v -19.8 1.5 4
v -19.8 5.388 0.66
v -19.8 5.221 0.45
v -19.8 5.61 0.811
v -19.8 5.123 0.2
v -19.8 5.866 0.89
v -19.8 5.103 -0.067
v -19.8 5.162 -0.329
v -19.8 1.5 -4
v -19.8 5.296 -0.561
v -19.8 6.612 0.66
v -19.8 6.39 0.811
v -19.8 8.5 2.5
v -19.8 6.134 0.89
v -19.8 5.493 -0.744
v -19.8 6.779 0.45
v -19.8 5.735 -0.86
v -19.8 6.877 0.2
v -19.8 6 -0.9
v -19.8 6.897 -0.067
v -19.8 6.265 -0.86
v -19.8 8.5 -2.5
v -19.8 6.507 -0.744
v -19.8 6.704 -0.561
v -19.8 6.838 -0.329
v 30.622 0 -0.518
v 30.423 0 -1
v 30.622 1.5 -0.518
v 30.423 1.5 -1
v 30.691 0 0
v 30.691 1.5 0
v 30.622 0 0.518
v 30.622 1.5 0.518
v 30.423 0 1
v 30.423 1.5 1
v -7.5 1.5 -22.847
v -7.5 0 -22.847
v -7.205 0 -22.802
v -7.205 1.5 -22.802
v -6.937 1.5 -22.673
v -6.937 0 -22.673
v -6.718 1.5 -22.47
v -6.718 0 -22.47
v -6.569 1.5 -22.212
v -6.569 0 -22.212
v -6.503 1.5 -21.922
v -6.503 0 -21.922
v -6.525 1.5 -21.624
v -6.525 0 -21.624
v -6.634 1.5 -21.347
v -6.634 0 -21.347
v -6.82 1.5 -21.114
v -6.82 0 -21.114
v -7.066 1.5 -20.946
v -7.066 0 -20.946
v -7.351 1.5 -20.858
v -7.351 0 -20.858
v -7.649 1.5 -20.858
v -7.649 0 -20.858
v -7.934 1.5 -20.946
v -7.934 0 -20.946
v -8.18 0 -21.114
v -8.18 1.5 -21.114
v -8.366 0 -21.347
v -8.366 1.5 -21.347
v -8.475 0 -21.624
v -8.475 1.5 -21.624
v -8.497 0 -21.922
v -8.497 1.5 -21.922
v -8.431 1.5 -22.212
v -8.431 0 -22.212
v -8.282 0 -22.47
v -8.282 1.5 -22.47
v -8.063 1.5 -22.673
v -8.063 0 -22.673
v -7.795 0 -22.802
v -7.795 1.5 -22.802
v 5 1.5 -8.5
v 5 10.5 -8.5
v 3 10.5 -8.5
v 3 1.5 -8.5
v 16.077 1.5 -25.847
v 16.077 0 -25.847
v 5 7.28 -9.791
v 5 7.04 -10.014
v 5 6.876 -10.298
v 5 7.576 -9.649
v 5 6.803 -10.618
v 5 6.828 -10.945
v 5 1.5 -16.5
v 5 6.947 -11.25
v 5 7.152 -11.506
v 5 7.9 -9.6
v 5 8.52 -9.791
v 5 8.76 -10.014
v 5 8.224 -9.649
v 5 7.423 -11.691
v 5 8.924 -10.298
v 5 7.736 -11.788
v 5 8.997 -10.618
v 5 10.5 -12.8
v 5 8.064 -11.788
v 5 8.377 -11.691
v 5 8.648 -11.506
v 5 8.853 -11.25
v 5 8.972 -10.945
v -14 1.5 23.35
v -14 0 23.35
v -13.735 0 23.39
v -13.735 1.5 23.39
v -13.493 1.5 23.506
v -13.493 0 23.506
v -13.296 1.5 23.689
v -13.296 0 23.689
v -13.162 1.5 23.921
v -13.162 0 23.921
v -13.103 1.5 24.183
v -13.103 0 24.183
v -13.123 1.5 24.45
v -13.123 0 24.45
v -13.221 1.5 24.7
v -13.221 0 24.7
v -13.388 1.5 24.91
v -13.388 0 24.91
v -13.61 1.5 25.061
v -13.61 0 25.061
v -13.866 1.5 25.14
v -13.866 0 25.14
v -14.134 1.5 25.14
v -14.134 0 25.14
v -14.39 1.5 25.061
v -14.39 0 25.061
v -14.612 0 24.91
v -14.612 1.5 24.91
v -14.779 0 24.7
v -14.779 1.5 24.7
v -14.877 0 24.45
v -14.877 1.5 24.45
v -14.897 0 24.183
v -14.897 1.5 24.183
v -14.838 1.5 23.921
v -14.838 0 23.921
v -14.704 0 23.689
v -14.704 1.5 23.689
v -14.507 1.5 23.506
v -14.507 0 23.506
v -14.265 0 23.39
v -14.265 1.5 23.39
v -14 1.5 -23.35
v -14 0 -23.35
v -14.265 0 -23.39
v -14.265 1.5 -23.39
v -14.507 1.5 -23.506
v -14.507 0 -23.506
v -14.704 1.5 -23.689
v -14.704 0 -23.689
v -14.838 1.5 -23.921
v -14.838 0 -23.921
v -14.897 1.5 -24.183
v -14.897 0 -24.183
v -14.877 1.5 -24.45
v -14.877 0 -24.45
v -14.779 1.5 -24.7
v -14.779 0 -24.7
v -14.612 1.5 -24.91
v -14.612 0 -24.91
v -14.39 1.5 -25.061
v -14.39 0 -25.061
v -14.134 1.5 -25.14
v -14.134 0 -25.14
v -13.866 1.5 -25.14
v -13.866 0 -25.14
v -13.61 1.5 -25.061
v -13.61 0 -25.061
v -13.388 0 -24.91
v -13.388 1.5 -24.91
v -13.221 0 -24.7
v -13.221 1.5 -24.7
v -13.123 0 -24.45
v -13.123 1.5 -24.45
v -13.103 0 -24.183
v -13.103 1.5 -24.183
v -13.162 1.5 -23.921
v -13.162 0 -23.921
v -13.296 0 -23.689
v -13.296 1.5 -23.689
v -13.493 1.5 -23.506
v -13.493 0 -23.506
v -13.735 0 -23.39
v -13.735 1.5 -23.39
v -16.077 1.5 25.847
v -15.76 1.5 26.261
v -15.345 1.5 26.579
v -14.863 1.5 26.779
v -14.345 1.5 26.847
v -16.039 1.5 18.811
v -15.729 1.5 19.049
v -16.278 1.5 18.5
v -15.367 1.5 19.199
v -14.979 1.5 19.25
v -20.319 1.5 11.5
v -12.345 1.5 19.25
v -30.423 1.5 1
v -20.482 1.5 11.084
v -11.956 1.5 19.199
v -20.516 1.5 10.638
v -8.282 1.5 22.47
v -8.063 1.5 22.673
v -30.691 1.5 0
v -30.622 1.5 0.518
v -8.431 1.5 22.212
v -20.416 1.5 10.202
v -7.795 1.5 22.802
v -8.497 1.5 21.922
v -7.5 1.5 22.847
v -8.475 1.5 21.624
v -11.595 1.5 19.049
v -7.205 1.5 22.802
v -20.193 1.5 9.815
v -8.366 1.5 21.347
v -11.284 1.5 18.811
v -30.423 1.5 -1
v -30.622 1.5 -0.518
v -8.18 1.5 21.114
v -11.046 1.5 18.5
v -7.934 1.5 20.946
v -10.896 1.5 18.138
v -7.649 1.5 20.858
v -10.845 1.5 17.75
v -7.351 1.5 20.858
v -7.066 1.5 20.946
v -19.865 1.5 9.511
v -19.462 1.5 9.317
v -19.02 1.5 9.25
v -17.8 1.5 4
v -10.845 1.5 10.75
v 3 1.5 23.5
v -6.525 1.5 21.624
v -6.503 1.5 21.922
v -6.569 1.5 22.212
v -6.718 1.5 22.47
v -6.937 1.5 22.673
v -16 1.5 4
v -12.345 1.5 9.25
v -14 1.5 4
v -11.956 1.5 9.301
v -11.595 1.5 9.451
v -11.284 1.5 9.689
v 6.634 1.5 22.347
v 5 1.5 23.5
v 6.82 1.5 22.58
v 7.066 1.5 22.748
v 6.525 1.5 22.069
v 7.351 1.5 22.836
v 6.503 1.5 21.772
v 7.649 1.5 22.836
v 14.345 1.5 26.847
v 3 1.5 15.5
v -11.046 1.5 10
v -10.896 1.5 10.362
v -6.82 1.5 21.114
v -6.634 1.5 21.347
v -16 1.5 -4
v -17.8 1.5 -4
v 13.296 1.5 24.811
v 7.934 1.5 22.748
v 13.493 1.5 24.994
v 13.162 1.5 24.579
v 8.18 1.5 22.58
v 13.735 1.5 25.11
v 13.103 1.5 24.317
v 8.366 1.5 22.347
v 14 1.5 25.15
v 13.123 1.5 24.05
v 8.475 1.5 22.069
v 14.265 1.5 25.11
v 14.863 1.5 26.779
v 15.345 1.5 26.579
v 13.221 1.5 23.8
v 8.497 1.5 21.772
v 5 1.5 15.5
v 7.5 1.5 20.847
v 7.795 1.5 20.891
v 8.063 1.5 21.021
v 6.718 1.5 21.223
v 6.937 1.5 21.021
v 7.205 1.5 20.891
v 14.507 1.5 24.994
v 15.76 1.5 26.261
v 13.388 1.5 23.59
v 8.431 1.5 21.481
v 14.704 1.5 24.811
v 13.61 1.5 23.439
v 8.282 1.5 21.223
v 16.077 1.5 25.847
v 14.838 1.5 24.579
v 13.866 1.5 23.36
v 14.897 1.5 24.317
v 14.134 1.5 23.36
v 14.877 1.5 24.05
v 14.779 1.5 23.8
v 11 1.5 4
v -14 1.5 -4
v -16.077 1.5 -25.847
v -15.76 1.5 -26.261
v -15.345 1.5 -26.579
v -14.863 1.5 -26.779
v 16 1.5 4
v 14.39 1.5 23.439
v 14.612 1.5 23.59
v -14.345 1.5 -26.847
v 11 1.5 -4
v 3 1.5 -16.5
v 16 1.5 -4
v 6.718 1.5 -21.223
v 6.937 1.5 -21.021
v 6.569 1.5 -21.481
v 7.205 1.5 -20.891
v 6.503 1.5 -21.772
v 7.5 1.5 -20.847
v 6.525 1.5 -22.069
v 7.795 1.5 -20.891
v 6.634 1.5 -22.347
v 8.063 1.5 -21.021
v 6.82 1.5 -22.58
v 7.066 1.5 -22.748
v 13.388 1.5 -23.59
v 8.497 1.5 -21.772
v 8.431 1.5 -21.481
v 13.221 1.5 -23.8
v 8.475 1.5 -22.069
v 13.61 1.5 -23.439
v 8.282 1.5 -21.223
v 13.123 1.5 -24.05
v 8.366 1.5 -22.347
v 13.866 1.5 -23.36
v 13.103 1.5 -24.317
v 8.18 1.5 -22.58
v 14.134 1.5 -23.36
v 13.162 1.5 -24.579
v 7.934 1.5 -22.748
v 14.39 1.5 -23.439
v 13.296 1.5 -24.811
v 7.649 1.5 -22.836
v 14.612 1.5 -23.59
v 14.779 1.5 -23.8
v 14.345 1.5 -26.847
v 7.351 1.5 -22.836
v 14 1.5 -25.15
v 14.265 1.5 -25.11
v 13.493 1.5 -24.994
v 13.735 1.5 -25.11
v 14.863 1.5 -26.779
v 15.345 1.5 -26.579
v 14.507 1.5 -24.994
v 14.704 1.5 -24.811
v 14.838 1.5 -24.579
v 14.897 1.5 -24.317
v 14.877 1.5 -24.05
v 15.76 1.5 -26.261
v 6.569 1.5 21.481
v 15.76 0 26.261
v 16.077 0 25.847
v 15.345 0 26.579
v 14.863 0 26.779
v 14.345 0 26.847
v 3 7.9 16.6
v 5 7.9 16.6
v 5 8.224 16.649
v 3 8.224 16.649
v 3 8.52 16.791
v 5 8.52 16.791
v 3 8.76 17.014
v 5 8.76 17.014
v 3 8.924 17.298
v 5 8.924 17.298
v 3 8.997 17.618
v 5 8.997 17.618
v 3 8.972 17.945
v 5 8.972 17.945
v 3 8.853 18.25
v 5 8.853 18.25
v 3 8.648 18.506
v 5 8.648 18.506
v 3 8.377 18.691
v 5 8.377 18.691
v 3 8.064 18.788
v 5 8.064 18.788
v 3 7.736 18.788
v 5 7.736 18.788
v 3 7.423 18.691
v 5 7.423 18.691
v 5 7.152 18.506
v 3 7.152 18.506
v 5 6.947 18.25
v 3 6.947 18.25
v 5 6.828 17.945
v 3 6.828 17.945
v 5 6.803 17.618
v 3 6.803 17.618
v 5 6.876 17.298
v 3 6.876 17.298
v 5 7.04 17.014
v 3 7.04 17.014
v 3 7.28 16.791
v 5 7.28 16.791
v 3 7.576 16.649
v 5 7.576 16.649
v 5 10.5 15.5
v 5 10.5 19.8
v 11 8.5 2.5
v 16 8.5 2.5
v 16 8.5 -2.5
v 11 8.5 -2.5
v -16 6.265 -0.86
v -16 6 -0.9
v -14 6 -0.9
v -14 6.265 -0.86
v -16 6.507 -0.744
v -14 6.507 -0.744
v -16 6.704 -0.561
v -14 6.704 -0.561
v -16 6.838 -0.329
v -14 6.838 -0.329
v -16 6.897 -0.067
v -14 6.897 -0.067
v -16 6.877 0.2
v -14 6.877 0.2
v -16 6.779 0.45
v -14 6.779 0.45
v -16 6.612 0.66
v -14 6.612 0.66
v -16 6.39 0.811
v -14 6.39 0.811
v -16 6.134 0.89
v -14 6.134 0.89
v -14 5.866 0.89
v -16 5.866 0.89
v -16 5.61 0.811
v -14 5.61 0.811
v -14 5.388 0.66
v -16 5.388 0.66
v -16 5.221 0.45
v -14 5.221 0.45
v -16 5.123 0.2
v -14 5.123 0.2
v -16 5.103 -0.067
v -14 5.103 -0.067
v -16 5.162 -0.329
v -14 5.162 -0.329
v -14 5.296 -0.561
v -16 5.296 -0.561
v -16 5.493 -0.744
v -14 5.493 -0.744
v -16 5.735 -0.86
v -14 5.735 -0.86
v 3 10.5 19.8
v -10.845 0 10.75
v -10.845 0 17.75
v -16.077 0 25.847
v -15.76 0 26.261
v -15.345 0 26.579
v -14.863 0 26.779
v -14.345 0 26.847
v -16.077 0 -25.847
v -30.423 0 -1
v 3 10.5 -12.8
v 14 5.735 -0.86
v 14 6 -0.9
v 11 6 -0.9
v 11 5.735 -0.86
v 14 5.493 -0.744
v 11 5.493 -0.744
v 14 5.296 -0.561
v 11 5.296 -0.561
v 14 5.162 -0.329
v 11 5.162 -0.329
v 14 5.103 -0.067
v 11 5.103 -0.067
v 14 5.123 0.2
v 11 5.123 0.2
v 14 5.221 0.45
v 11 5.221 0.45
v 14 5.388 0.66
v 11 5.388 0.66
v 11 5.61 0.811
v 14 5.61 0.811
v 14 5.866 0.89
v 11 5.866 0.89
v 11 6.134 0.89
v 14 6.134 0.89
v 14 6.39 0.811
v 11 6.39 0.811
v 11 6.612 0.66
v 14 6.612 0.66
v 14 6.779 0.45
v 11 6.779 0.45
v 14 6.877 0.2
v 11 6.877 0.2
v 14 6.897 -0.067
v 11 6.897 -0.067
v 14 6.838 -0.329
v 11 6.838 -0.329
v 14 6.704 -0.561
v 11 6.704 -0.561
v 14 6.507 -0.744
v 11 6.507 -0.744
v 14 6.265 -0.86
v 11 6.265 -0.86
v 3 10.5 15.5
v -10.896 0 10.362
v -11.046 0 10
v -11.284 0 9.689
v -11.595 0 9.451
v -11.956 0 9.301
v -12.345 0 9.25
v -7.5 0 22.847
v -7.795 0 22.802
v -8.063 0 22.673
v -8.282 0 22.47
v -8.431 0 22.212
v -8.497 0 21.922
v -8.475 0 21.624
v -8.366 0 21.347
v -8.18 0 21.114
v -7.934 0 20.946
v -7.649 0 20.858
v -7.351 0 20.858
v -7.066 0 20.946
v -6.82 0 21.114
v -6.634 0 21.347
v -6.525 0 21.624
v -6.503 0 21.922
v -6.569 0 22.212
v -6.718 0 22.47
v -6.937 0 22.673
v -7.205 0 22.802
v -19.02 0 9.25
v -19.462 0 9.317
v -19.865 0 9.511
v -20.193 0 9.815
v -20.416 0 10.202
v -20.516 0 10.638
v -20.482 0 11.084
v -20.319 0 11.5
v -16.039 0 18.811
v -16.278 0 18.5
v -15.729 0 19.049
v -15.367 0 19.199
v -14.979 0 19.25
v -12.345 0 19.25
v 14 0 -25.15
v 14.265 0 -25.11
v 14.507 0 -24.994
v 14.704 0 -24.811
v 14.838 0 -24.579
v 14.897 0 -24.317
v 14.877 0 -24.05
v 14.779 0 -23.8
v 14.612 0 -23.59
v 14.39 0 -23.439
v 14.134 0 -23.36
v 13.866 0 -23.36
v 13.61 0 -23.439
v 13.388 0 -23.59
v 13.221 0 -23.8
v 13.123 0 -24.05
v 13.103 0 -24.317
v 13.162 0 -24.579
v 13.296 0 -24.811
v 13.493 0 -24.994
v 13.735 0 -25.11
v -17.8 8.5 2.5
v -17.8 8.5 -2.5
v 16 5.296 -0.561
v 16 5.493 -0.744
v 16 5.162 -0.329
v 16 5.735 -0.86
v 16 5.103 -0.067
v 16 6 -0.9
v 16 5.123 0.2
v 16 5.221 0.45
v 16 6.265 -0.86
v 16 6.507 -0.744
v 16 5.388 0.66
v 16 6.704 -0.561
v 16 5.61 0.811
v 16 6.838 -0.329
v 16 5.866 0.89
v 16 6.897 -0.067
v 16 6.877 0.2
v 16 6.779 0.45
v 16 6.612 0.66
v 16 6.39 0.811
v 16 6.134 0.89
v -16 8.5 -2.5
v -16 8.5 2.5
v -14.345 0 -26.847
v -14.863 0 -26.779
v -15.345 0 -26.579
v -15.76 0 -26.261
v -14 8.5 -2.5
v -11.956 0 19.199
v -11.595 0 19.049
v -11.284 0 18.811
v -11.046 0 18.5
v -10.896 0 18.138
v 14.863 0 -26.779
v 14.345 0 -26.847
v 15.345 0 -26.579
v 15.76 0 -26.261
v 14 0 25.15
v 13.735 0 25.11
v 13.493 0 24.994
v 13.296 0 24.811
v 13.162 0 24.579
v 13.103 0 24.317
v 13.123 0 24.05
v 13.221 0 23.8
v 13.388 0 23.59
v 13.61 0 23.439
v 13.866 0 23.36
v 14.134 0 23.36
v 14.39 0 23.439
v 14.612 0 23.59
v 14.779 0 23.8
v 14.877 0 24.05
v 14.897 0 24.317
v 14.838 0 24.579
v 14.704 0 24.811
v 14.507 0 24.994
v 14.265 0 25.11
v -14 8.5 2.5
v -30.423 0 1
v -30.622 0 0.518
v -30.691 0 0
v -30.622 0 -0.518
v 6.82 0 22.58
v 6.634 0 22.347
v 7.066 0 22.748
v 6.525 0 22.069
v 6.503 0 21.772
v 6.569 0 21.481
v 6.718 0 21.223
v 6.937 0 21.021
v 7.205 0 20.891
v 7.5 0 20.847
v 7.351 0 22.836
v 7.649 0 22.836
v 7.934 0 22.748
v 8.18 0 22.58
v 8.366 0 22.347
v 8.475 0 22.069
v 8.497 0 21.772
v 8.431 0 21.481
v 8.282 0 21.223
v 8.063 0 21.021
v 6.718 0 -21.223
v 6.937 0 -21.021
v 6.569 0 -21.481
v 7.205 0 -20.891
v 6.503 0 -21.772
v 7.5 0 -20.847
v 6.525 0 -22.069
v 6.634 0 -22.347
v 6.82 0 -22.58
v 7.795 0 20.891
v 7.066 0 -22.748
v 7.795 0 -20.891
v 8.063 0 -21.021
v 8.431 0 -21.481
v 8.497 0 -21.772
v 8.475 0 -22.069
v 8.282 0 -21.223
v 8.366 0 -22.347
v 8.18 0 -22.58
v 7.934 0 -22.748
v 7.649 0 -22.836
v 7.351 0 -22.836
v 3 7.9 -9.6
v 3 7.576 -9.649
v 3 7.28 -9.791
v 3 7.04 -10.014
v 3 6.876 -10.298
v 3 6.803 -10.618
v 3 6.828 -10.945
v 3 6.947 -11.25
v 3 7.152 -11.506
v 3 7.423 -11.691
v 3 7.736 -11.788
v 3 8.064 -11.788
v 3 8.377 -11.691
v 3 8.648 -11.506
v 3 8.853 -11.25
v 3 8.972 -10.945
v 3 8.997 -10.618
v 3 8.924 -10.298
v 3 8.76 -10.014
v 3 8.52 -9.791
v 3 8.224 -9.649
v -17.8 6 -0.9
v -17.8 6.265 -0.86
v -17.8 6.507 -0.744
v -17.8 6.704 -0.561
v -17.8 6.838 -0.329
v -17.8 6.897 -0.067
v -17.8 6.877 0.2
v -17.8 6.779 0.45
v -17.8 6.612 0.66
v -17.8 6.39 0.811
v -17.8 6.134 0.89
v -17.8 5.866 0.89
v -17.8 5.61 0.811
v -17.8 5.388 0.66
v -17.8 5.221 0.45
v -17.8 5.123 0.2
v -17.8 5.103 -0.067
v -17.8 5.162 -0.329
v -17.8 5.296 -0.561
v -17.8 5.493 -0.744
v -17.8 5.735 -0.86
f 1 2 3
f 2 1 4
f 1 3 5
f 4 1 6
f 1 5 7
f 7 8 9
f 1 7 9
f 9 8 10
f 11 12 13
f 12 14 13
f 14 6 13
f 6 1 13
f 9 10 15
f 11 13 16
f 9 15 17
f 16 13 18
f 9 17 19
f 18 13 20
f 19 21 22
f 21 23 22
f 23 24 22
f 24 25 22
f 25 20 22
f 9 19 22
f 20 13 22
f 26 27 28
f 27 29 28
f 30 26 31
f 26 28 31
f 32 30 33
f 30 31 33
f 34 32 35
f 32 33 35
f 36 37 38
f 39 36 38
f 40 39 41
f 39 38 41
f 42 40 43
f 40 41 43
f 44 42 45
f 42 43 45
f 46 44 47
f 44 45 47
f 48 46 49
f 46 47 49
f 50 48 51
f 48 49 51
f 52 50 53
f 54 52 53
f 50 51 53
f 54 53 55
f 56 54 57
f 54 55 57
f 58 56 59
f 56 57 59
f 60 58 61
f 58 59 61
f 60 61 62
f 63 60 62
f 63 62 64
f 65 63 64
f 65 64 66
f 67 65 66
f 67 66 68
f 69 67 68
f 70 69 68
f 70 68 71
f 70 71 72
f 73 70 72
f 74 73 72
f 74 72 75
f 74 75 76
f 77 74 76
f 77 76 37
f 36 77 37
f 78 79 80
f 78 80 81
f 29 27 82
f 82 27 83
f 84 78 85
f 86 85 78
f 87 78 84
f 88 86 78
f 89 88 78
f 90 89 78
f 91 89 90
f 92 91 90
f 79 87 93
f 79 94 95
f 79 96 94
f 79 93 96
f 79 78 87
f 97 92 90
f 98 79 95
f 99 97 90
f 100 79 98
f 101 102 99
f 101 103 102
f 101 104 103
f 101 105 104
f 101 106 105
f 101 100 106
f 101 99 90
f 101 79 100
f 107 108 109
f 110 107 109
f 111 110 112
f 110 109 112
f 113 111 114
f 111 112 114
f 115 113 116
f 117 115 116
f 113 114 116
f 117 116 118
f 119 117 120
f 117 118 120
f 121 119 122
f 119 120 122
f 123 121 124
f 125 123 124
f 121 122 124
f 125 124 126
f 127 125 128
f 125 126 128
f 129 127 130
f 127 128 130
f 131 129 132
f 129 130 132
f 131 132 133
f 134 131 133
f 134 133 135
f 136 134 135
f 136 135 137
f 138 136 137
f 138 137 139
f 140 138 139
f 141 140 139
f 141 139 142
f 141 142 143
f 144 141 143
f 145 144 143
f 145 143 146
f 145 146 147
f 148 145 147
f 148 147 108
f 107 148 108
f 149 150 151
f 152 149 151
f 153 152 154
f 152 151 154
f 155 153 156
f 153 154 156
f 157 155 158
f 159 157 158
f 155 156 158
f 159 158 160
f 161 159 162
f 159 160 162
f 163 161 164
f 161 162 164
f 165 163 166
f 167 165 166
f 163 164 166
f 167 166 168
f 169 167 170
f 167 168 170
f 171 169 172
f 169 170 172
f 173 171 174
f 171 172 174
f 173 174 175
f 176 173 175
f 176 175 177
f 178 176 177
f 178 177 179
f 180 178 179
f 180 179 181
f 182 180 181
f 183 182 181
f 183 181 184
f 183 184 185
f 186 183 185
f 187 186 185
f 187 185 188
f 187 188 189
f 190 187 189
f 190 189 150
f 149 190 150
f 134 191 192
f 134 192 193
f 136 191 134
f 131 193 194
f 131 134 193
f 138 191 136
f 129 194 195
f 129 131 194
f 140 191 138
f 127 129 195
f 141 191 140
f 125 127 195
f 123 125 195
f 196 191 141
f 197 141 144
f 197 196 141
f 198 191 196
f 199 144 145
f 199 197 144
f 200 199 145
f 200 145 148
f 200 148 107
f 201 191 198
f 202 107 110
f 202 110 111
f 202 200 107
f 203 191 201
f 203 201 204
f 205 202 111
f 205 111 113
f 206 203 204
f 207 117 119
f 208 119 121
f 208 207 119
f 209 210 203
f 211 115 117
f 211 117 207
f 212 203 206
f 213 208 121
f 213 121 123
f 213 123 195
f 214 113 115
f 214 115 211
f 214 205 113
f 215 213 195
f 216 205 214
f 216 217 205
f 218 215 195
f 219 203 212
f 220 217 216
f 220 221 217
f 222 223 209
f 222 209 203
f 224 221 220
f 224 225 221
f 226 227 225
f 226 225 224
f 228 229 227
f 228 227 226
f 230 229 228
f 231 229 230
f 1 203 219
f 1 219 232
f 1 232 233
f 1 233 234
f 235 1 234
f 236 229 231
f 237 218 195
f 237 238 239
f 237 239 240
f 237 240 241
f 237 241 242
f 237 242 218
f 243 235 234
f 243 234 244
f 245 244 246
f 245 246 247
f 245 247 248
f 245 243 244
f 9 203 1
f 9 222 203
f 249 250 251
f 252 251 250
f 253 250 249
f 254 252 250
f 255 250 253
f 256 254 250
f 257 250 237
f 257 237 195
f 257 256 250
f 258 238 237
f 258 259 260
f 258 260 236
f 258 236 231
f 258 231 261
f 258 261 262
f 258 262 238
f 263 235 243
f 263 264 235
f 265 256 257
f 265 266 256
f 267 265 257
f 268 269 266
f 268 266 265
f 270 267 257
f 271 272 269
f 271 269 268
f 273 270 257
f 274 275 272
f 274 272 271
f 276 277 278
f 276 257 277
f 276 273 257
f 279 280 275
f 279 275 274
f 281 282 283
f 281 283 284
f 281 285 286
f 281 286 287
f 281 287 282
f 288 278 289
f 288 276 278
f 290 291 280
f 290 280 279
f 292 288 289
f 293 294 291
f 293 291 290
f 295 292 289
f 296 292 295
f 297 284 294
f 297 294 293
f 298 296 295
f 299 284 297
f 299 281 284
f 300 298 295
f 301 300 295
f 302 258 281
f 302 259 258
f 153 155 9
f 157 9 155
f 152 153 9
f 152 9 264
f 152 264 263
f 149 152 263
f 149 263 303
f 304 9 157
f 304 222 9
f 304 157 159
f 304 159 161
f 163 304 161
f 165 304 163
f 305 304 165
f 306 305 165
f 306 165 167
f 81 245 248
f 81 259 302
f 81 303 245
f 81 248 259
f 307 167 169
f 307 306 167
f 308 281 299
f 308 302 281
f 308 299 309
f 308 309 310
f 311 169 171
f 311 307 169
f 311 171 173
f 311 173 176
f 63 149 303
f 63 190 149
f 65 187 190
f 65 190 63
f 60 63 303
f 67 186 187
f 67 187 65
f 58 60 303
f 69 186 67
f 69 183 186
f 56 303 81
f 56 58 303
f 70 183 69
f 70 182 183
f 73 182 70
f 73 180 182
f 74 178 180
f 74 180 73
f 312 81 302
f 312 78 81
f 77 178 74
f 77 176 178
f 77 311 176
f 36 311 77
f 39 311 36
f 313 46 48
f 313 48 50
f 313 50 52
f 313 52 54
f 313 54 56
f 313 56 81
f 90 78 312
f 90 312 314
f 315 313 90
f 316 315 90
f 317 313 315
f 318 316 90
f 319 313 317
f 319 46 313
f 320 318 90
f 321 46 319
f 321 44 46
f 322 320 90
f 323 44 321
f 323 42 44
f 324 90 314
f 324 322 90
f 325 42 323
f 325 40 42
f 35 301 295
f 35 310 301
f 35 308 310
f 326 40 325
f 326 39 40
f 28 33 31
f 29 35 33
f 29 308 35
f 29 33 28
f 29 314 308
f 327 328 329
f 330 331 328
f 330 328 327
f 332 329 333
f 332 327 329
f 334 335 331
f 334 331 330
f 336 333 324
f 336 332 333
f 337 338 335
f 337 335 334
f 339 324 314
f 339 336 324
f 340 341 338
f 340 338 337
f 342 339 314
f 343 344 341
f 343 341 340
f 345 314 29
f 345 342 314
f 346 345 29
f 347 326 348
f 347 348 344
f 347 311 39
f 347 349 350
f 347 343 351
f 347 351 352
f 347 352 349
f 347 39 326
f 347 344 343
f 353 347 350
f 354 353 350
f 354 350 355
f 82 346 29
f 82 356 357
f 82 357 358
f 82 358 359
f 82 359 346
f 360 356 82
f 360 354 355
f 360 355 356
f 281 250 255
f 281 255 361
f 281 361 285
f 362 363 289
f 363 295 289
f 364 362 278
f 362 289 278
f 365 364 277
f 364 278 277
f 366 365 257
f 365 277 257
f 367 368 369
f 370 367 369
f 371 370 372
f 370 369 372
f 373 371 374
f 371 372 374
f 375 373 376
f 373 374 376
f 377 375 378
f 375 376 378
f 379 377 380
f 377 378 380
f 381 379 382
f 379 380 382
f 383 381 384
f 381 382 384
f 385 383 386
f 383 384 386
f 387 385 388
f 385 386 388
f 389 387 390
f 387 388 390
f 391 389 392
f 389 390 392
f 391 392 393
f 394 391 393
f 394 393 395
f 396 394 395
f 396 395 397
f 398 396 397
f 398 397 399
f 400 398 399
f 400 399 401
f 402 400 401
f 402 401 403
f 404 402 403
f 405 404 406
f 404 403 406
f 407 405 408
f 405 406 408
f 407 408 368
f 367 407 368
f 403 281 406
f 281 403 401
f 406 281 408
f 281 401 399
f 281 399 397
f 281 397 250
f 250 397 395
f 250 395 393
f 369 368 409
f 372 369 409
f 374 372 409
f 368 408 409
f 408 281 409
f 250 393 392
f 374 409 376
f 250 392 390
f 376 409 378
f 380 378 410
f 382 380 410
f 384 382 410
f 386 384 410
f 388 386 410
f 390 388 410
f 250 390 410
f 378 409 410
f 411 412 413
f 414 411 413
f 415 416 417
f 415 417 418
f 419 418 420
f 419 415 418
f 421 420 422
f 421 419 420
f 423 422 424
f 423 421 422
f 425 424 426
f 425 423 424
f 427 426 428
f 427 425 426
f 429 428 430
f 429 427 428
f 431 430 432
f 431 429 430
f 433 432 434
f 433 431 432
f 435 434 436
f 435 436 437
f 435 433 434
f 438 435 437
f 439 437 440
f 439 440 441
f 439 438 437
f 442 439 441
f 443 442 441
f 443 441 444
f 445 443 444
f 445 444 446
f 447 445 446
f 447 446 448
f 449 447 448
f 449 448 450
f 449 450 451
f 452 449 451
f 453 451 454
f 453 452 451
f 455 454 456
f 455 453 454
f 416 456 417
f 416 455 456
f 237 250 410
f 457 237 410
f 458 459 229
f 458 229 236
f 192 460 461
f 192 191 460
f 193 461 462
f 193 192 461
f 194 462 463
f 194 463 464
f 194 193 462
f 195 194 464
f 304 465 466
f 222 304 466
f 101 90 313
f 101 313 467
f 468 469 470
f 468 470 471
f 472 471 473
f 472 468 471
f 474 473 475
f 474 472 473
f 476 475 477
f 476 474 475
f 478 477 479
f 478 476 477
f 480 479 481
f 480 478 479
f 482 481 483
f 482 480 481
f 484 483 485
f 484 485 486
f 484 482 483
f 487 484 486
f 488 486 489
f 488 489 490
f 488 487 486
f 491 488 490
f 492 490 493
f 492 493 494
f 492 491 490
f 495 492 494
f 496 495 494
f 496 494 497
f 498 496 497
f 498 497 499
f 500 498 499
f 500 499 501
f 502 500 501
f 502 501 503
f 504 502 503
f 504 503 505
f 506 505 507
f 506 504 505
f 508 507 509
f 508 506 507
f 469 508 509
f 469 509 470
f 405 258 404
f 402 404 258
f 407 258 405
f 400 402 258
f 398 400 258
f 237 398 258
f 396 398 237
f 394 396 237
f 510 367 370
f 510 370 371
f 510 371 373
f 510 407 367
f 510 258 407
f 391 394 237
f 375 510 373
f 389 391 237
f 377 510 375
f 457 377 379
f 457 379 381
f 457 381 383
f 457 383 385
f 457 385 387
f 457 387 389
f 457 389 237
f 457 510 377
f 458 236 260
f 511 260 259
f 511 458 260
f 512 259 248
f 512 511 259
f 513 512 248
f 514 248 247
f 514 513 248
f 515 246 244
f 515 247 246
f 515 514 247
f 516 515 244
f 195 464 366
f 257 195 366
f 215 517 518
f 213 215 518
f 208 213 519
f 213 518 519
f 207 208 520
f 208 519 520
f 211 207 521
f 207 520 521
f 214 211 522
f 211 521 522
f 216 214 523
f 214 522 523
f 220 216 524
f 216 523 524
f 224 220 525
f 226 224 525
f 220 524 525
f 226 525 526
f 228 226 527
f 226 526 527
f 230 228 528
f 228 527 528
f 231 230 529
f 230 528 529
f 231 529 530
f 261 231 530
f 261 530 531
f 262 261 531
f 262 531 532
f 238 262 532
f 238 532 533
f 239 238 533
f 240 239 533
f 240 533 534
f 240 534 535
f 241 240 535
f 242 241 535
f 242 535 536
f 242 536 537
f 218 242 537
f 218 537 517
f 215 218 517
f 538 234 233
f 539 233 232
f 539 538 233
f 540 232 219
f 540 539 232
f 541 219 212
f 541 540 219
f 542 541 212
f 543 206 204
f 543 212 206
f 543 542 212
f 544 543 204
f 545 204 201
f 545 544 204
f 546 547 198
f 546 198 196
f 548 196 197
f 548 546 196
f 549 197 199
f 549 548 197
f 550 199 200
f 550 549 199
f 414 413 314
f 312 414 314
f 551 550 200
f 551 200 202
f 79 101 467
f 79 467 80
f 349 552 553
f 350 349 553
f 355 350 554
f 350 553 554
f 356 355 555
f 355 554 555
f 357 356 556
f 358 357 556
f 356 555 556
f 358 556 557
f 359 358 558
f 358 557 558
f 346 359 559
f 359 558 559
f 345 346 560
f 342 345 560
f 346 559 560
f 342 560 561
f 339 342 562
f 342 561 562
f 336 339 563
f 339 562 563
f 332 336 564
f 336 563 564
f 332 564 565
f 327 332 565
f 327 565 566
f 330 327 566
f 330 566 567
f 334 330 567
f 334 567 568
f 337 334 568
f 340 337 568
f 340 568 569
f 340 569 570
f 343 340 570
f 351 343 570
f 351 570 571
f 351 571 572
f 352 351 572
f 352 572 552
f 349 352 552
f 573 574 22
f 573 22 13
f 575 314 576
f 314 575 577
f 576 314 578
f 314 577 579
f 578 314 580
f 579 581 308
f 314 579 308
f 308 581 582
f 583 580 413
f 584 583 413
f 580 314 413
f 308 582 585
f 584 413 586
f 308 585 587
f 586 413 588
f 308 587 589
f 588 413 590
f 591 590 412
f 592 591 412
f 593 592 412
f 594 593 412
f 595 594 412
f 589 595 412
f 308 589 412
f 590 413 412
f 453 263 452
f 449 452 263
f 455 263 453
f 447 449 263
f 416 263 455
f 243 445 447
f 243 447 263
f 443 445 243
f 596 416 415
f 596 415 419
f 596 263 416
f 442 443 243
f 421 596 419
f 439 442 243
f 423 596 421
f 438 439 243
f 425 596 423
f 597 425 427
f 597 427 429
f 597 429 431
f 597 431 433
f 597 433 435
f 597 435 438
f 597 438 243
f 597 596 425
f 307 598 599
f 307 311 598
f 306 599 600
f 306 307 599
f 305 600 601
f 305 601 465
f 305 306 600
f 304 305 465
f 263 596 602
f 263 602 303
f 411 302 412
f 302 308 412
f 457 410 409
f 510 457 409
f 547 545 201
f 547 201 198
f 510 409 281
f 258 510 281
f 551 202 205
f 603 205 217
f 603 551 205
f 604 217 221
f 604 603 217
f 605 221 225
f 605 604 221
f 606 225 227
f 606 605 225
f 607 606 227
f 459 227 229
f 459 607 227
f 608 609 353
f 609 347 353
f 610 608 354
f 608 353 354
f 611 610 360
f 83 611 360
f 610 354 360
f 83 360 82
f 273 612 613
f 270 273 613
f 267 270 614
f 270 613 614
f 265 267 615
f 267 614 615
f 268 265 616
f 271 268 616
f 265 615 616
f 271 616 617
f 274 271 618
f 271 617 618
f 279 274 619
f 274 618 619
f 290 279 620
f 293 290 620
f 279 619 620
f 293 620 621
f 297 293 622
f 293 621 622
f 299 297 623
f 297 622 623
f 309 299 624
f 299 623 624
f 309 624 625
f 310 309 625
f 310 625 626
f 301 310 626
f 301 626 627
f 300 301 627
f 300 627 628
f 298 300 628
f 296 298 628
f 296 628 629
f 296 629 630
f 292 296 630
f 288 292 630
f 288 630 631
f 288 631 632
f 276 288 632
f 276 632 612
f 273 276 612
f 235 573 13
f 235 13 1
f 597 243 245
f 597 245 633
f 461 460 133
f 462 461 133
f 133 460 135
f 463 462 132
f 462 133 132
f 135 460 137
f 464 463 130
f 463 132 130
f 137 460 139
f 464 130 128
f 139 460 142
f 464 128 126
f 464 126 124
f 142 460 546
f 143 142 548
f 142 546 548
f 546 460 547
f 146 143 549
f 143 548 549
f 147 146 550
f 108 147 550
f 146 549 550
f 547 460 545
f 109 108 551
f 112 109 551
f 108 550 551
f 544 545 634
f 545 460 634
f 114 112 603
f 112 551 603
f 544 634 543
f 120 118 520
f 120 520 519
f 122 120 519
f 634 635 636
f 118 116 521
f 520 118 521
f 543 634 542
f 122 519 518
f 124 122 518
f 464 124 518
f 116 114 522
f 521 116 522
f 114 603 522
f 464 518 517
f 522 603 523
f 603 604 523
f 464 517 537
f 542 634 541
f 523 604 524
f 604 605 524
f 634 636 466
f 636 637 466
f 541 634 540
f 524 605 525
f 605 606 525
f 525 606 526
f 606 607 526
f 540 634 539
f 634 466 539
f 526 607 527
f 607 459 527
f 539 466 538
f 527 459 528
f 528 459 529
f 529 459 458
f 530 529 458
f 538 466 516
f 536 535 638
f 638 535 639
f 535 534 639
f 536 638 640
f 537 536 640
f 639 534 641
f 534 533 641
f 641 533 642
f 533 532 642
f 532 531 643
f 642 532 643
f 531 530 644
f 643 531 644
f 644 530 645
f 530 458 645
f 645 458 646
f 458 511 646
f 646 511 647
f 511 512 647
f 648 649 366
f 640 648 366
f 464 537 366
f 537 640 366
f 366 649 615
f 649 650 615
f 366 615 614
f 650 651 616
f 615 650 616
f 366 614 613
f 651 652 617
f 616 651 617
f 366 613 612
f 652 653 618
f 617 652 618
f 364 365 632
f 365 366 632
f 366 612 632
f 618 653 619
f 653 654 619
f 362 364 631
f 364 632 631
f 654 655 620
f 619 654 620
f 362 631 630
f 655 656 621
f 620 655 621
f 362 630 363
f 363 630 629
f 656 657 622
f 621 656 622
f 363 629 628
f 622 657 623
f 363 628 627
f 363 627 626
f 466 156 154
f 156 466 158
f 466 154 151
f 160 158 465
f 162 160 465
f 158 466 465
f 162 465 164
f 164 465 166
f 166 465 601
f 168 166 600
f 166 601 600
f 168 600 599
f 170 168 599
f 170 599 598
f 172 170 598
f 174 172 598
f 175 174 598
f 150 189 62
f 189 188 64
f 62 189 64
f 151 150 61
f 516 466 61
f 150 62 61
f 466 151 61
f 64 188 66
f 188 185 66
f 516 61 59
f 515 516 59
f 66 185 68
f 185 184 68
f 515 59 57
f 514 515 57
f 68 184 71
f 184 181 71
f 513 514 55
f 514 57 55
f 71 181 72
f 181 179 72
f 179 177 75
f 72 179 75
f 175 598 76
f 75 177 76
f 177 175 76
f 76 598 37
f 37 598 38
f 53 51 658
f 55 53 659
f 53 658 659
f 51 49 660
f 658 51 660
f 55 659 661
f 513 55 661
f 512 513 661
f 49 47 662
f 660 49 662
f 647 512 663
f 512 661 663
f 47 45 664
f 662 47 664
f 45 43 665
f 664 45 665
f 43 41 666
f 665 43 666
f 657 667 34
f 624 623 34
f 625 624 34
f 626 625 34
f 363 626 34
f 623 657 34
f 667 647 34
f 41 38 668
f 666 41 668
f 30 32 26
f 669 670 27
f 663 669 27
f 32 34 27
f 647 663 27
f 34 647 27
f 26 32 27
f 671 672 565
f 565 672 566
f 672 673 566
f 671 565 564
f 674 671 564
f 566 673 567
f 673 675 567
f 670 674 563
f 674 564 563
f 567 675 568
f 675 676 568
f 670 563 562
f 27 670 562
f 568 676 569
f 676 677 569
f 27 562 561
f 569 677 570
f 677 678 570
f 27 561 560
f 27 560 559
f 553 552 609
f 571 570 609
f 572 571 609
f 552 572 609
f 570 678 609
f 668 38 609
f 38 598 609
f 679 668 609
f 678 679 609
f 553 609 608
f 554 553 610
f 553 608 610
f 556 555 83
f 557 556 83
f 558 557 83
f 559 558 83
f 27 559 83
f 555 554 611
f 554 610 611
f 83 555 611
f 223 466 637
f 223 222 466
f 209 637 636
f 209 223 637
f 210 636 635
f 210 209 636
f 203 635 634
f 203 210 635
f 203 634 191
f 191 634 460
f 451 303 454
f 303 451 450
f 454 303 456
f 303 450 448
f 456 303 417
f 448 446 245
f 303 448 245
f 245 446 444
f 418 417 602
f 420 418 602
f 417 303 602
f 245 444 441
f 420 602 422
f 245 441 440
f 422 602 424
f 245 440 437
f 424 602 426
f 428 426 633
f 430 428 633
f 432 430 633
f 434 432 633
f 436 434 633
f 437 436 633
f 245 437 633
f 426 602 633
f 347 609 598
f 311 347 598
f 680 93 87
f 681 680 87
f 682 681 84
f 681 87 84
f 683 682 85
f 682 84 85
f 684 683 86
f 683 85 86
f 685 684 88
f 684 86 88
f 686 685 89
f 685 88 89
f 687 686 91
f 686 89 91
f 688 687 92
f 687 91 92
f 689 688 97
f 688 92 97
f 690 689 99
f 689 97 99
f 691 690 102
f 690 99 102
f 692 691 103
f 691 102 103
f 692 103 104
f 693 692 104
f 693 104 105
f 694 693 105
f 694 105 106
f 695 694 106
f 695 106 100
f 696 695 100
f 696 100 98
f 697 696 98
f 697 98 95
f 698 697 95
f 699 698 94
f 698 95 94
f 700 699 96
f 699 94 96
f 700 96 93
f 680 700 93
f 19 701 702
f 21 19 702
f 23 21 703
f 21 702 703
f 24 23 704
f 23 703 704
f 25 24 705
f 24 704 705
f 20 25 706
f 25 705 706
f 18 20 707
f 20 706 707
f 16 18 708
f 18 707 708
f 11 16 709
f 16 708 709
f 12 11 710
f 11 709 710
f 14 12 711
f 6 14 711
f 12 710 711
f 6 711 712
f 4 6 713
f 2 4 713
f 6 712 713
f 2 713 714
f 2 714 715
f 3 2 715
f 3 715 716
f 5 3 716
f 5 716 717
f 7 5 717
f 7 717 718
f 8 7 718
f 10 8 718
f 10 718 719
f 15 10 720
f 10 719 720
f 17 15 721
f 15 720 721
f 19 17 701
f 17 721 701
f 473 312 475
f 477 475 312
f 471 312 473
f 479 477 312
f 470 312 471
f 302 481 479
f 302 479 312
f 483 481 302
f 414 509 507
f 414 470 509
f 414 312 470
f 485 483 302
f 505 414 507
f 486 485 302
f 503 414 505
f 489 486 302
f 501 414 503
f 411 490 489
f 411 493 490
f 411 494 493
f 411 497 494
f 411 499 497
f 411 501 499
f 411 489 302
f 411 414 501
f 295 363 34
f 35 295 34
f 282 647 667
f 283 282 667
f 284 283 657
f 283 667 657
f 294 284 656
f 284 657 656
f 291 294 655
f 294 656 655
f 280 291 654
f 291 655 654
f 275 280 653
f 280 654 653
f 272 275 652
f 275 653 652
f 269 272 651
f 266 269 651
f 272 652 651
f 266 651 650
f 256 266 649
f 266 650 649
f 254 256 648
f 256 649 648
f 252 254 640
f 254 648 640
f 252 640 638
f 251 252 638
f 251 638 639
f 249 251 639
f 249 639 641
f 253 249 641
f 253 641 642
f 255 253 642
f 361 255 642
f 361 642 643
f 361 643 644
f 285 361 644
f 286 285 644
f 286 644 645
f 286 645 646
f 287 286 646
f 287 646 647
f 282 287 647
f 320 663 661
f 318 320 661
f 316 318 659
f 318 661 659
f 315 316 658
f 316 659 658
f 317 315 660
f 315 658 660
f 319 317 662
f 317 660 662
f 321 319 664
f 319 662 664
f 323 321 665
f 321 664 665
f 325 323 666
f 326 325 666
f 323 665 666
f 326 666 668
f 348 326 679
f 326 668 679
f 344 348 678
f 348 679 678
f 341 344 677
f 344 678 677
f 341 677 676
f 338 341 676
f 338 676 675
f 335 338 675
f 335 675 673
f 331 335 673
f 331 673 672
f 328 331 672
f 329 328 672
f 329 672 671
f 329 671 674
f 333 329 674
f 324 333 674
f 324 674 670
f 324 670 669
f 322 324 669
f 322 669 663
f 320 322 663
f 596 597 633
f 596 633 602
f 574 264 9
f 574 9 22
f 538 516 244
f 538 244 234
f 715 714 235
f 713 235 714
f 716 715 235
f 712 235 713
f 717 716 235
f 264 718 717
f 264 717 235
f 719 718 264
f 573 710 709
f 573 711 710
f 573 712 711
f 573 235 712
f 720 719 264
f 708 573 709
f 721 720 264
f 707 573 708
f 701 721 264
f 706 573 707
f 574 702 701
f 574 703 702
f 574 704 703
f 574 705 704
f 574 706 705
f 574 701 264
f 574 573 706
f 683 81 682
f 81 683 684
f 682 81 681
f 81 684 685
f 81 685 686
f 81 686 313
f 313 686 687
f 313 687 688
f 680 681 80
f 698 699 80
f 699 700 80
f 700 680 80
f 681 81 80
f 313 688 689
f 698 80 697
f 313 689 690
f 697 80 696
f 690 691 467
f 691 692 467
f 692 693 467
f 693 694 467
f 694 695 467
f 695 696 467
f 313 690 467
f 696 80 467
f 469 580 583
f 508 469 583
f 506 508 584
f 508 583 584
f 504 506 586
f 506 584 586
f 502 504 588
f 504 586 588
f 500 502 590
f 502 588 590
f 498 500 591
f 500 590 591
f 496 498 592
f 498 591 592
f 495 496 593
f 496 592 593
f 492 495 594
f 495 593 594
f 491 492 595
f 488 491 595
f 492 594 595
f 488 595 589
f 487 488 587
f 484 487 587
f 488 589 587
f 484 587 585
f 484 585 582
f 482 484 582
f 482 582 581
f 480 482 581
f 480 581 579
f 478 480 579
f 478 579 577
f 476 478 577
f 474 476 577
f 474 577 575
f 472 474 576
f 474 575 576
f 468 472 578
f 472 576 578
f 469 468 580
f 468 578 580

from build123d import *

# Parameters (mm, degrees)
EXTRUDE_1_DEPTH     = 1.5
SKETCH_3_R          = 0.9
EXTRUDE_2_DEPTH     = 2
SKETCH_4_R          = 0.9
EXTRUDE_3_DEPTH     = 2
SKETCH_5_R          = 1.1
EXTRUDE_4_DEPTH     = 2
FILLET_1_R          = 2
SKETCH_6_R          = 0.9
CUT_EXTRUDE_1_DEPTH = 10
SKETCH_7_R          = 1
CUT_EXTRUDE_2_DEPTH = 10
SKETCH_8_R          = 0.9
EXTRUDE_5_DEPTH     = 3
CUT_EXTRUDE_3_DEPTH = 3


with BuildPart() as part:
    # 草图1 → 凸台-拉伸1 (new body)
    with BuildSketch(Plane(origin=(0, 0, 0), x_dir=(1, 0, 0), z_dir=(0, 1, 0))):
        Polygon((15.5, 26.846787517), (-15.5, 26.846787517), (-31, 0), (-15.5, -26.846787517), (15.5, -26.846787517), (31, 0), align=None)
    extrude(amount=EXTRUDE_1_DEPTH)

    # 草图3 → 凸台-拉伸2 (add)
    with BuildSketch(Plane(origin=(16, 0, 0), x_dir=(0, 0, -1), z_dir=(1, 0, 0))):
        Polygon((-4, 1.5), (-2.5, 8.5), (2.5, 8.5), (4, 1.5), align=None)
        with Locations((0, 6)):
            Circle(SKETCH_3_R, mode=Mode.SUBTRACT)
    extrude_2 = extrude(amount=-EXTRUDE_2_DEPTH)

    # 草图4 → 凸台-拉伸3 (add)
    with BuildSketch(Plane(origin=(17.8, 0, 0), x_dir=(0, 0, -1), z_dir=(1, 0, 0))):
        Polygon((-4, 1.5), (4, 1.5), (2.5, 8.5), (-2.5, 8.5), align=None)
        with Locations((0, 6)):
            Circle(SKETCH_4_R, mode=Mode.SUBTRACT)
    extrude_3 = extrude(amount=EXTRUDE_3_DEPTH)

    # 镜向3: 凸台-拉伸2, 凸台-拉伸3 across plane
    add(extrude_2.mirror(Plane(origin=(0, 0, 0), x_dir=(0, 0, 1), z_dir=(1, 0, 0))))
    add(extrude_3.mirror(Plane(origin=(0, 0, 0), x_dir=(0, 0, 1), z_dir=(1, 0, 0))))

    # 草图5 → 凸台-拉伸4 (add)
    with BuildSketch(Plane(origin=(5, 0, 0), x_dir=(0, 0, -1), z_dir=(1, 0, 0))):
        Polygon((-19.8, 10.5), (-15.5, 10.5), (-15.5, 1.5), (-23.5, 1.5), align=None)
        with Locations((-17.7, 7.9)):
            Circle(SKETCH_5_R, mode=Mode.SUBTRACT)
        Polygon((8.5, 10.5), (8.5, 1.5), (16.5, 1.5), (12.8, 10.5), align=None)
        with Locations(Location((10.7, 7.9, 0), (0, 0, 180))):  # turned: the seam where the file's is
            Circle(SKETCH_5_R, mode=Mode.SUBTRACT)
    extrude(amount=-EXTRUDE_4_DEPTH)

    # 圆角1
    fillet_1_edges = [part.edges().sort_by_distance(p)[0] for p in [
        (31, 0.75, 0),
        (15.5, 0.75, 26.846787517),
        (-15.5, 0.75, 26.846787517),
        (-31, 0.75, 0),
        (-15.5, 0.75, -26.846787517),
        (15.5, 0.75, -26.846787517),
    ]]
    fillet(fillet_1_edges, radius=FILLET_1_R)

    # 草图6 → 切除-拉伸1 (cut)
    with BuildSketch(Plane.XZ):
        with Locations(Location((-14, 24.25, 0), (0, 0, 270))):  # turned: the seam where the file's is
            Circle(SKETCH_6_R)
        with Locations(Location((14, 24.25, 0), (0, 0, 90))):  # turned: the seam where the file's is
            Circle(SKETCH_6_R)
        with Locations(Location((14, -24.25, 0), (0, 0, 270))):  # turned: the seam where the file's is
            Circle(SKETCH_6_R)
        with Locations(Location((-14, -24.25, 0), (0, 0, 90))):  # turned: the seam where the file's is
            Circle(SKETCH_6_R)
        with BuildLine():
            Line((-14.97853003, 19.25), (-12.344555434, 19.25))
            ThreePointArc((-12.344555434, 19.25), (-11.283895262, 18.810660172), (-10.844555434, 17.75))
            Line((-10.844555434, 17.75), (-10.844555434, 10.75))
            ThreePointArc((-10.844555434, 10.75), (-11.283895262, 9.689339828), (-12.344555434, 9.25))
            Line((-12.344555434, 9.25), (-19.019981914, 9.25))
            ThreePointArc((-19.019981914, 9.25), (-20.31902002, 10), (-20.31902002, 11.5))
            Line((-20.31902002, 11.5), (-16.277568136, 18.5))
            ThreePointArc((-16.277568136, 18.5), (-15.72853003, 19.049038106), (-14.97853003, 19.25))
        make_face()
    extrude(amount=-CUT_EXTRUDE_1_DEPTH, mode=Mode.SUBTRACT)

    # 草图7 → 切除-拉伸2 (cut)
    with BuildSketch(Plane.XZ):
        with Locations(Location((-7.5, -21.846787517, 0), (0, 0, 270))):  # turned: the seam where the file's is
            Circle(SKETCH_7_R)
        with Locations(Location((7.5, -21.846787517, 0), (0, 0, 90))):  # turned: the seam where the file's is
            Circle(SKETCH_7_R)
        with Locations(Location((7.5, 21.846787517, 0), (0, 0, 270))):  # turned: the seam where the file's is
            Circle(SKETCH_7_R)
        with Locations(Location((-7.5, 21.846787517, 0), (0, 0, 90))):  # turned: the seam where the file's is
            Circle(SKETCH_7_R)
    extrude(amount=-CUT_EXTRUDE_2_DEPTH, mode=Mode.SUBTRACT)

    # 草图8 → 凸台-拉伸5 (add)
    with BuildSketch(Plane.ZY.offset(-14)):
        Polygon((-4, 1.5), (4, 1.5), (2.5, 8.5), (-2.5, 8.5), align=None)
        with Locations(Location((0, 6, 0), (0, 0, 180))):  # turned: the seam where the file's is
            Circle(SKETCH_8_R, mode=Mode.SUBTRACT)
    extrude(amount=EXTRUDE_5_DEPTH)

    # 草图9 → 切除-拉伸3 (cut)
    with BuildSketch(Plane(origin=(19.8, 0, 0), x_dir=(0, 0, -1), z_dir=(1, 0, 0))):
        Polygon((-2.5, 8.5), (-4, 1.5), (4, 1.5), (2.5, 8.5), align=None)
    extrude(amount=-CUT_EXTRUDE_3_DEPTH, mode=Mode.SUBTRACT)


solid = part.part
